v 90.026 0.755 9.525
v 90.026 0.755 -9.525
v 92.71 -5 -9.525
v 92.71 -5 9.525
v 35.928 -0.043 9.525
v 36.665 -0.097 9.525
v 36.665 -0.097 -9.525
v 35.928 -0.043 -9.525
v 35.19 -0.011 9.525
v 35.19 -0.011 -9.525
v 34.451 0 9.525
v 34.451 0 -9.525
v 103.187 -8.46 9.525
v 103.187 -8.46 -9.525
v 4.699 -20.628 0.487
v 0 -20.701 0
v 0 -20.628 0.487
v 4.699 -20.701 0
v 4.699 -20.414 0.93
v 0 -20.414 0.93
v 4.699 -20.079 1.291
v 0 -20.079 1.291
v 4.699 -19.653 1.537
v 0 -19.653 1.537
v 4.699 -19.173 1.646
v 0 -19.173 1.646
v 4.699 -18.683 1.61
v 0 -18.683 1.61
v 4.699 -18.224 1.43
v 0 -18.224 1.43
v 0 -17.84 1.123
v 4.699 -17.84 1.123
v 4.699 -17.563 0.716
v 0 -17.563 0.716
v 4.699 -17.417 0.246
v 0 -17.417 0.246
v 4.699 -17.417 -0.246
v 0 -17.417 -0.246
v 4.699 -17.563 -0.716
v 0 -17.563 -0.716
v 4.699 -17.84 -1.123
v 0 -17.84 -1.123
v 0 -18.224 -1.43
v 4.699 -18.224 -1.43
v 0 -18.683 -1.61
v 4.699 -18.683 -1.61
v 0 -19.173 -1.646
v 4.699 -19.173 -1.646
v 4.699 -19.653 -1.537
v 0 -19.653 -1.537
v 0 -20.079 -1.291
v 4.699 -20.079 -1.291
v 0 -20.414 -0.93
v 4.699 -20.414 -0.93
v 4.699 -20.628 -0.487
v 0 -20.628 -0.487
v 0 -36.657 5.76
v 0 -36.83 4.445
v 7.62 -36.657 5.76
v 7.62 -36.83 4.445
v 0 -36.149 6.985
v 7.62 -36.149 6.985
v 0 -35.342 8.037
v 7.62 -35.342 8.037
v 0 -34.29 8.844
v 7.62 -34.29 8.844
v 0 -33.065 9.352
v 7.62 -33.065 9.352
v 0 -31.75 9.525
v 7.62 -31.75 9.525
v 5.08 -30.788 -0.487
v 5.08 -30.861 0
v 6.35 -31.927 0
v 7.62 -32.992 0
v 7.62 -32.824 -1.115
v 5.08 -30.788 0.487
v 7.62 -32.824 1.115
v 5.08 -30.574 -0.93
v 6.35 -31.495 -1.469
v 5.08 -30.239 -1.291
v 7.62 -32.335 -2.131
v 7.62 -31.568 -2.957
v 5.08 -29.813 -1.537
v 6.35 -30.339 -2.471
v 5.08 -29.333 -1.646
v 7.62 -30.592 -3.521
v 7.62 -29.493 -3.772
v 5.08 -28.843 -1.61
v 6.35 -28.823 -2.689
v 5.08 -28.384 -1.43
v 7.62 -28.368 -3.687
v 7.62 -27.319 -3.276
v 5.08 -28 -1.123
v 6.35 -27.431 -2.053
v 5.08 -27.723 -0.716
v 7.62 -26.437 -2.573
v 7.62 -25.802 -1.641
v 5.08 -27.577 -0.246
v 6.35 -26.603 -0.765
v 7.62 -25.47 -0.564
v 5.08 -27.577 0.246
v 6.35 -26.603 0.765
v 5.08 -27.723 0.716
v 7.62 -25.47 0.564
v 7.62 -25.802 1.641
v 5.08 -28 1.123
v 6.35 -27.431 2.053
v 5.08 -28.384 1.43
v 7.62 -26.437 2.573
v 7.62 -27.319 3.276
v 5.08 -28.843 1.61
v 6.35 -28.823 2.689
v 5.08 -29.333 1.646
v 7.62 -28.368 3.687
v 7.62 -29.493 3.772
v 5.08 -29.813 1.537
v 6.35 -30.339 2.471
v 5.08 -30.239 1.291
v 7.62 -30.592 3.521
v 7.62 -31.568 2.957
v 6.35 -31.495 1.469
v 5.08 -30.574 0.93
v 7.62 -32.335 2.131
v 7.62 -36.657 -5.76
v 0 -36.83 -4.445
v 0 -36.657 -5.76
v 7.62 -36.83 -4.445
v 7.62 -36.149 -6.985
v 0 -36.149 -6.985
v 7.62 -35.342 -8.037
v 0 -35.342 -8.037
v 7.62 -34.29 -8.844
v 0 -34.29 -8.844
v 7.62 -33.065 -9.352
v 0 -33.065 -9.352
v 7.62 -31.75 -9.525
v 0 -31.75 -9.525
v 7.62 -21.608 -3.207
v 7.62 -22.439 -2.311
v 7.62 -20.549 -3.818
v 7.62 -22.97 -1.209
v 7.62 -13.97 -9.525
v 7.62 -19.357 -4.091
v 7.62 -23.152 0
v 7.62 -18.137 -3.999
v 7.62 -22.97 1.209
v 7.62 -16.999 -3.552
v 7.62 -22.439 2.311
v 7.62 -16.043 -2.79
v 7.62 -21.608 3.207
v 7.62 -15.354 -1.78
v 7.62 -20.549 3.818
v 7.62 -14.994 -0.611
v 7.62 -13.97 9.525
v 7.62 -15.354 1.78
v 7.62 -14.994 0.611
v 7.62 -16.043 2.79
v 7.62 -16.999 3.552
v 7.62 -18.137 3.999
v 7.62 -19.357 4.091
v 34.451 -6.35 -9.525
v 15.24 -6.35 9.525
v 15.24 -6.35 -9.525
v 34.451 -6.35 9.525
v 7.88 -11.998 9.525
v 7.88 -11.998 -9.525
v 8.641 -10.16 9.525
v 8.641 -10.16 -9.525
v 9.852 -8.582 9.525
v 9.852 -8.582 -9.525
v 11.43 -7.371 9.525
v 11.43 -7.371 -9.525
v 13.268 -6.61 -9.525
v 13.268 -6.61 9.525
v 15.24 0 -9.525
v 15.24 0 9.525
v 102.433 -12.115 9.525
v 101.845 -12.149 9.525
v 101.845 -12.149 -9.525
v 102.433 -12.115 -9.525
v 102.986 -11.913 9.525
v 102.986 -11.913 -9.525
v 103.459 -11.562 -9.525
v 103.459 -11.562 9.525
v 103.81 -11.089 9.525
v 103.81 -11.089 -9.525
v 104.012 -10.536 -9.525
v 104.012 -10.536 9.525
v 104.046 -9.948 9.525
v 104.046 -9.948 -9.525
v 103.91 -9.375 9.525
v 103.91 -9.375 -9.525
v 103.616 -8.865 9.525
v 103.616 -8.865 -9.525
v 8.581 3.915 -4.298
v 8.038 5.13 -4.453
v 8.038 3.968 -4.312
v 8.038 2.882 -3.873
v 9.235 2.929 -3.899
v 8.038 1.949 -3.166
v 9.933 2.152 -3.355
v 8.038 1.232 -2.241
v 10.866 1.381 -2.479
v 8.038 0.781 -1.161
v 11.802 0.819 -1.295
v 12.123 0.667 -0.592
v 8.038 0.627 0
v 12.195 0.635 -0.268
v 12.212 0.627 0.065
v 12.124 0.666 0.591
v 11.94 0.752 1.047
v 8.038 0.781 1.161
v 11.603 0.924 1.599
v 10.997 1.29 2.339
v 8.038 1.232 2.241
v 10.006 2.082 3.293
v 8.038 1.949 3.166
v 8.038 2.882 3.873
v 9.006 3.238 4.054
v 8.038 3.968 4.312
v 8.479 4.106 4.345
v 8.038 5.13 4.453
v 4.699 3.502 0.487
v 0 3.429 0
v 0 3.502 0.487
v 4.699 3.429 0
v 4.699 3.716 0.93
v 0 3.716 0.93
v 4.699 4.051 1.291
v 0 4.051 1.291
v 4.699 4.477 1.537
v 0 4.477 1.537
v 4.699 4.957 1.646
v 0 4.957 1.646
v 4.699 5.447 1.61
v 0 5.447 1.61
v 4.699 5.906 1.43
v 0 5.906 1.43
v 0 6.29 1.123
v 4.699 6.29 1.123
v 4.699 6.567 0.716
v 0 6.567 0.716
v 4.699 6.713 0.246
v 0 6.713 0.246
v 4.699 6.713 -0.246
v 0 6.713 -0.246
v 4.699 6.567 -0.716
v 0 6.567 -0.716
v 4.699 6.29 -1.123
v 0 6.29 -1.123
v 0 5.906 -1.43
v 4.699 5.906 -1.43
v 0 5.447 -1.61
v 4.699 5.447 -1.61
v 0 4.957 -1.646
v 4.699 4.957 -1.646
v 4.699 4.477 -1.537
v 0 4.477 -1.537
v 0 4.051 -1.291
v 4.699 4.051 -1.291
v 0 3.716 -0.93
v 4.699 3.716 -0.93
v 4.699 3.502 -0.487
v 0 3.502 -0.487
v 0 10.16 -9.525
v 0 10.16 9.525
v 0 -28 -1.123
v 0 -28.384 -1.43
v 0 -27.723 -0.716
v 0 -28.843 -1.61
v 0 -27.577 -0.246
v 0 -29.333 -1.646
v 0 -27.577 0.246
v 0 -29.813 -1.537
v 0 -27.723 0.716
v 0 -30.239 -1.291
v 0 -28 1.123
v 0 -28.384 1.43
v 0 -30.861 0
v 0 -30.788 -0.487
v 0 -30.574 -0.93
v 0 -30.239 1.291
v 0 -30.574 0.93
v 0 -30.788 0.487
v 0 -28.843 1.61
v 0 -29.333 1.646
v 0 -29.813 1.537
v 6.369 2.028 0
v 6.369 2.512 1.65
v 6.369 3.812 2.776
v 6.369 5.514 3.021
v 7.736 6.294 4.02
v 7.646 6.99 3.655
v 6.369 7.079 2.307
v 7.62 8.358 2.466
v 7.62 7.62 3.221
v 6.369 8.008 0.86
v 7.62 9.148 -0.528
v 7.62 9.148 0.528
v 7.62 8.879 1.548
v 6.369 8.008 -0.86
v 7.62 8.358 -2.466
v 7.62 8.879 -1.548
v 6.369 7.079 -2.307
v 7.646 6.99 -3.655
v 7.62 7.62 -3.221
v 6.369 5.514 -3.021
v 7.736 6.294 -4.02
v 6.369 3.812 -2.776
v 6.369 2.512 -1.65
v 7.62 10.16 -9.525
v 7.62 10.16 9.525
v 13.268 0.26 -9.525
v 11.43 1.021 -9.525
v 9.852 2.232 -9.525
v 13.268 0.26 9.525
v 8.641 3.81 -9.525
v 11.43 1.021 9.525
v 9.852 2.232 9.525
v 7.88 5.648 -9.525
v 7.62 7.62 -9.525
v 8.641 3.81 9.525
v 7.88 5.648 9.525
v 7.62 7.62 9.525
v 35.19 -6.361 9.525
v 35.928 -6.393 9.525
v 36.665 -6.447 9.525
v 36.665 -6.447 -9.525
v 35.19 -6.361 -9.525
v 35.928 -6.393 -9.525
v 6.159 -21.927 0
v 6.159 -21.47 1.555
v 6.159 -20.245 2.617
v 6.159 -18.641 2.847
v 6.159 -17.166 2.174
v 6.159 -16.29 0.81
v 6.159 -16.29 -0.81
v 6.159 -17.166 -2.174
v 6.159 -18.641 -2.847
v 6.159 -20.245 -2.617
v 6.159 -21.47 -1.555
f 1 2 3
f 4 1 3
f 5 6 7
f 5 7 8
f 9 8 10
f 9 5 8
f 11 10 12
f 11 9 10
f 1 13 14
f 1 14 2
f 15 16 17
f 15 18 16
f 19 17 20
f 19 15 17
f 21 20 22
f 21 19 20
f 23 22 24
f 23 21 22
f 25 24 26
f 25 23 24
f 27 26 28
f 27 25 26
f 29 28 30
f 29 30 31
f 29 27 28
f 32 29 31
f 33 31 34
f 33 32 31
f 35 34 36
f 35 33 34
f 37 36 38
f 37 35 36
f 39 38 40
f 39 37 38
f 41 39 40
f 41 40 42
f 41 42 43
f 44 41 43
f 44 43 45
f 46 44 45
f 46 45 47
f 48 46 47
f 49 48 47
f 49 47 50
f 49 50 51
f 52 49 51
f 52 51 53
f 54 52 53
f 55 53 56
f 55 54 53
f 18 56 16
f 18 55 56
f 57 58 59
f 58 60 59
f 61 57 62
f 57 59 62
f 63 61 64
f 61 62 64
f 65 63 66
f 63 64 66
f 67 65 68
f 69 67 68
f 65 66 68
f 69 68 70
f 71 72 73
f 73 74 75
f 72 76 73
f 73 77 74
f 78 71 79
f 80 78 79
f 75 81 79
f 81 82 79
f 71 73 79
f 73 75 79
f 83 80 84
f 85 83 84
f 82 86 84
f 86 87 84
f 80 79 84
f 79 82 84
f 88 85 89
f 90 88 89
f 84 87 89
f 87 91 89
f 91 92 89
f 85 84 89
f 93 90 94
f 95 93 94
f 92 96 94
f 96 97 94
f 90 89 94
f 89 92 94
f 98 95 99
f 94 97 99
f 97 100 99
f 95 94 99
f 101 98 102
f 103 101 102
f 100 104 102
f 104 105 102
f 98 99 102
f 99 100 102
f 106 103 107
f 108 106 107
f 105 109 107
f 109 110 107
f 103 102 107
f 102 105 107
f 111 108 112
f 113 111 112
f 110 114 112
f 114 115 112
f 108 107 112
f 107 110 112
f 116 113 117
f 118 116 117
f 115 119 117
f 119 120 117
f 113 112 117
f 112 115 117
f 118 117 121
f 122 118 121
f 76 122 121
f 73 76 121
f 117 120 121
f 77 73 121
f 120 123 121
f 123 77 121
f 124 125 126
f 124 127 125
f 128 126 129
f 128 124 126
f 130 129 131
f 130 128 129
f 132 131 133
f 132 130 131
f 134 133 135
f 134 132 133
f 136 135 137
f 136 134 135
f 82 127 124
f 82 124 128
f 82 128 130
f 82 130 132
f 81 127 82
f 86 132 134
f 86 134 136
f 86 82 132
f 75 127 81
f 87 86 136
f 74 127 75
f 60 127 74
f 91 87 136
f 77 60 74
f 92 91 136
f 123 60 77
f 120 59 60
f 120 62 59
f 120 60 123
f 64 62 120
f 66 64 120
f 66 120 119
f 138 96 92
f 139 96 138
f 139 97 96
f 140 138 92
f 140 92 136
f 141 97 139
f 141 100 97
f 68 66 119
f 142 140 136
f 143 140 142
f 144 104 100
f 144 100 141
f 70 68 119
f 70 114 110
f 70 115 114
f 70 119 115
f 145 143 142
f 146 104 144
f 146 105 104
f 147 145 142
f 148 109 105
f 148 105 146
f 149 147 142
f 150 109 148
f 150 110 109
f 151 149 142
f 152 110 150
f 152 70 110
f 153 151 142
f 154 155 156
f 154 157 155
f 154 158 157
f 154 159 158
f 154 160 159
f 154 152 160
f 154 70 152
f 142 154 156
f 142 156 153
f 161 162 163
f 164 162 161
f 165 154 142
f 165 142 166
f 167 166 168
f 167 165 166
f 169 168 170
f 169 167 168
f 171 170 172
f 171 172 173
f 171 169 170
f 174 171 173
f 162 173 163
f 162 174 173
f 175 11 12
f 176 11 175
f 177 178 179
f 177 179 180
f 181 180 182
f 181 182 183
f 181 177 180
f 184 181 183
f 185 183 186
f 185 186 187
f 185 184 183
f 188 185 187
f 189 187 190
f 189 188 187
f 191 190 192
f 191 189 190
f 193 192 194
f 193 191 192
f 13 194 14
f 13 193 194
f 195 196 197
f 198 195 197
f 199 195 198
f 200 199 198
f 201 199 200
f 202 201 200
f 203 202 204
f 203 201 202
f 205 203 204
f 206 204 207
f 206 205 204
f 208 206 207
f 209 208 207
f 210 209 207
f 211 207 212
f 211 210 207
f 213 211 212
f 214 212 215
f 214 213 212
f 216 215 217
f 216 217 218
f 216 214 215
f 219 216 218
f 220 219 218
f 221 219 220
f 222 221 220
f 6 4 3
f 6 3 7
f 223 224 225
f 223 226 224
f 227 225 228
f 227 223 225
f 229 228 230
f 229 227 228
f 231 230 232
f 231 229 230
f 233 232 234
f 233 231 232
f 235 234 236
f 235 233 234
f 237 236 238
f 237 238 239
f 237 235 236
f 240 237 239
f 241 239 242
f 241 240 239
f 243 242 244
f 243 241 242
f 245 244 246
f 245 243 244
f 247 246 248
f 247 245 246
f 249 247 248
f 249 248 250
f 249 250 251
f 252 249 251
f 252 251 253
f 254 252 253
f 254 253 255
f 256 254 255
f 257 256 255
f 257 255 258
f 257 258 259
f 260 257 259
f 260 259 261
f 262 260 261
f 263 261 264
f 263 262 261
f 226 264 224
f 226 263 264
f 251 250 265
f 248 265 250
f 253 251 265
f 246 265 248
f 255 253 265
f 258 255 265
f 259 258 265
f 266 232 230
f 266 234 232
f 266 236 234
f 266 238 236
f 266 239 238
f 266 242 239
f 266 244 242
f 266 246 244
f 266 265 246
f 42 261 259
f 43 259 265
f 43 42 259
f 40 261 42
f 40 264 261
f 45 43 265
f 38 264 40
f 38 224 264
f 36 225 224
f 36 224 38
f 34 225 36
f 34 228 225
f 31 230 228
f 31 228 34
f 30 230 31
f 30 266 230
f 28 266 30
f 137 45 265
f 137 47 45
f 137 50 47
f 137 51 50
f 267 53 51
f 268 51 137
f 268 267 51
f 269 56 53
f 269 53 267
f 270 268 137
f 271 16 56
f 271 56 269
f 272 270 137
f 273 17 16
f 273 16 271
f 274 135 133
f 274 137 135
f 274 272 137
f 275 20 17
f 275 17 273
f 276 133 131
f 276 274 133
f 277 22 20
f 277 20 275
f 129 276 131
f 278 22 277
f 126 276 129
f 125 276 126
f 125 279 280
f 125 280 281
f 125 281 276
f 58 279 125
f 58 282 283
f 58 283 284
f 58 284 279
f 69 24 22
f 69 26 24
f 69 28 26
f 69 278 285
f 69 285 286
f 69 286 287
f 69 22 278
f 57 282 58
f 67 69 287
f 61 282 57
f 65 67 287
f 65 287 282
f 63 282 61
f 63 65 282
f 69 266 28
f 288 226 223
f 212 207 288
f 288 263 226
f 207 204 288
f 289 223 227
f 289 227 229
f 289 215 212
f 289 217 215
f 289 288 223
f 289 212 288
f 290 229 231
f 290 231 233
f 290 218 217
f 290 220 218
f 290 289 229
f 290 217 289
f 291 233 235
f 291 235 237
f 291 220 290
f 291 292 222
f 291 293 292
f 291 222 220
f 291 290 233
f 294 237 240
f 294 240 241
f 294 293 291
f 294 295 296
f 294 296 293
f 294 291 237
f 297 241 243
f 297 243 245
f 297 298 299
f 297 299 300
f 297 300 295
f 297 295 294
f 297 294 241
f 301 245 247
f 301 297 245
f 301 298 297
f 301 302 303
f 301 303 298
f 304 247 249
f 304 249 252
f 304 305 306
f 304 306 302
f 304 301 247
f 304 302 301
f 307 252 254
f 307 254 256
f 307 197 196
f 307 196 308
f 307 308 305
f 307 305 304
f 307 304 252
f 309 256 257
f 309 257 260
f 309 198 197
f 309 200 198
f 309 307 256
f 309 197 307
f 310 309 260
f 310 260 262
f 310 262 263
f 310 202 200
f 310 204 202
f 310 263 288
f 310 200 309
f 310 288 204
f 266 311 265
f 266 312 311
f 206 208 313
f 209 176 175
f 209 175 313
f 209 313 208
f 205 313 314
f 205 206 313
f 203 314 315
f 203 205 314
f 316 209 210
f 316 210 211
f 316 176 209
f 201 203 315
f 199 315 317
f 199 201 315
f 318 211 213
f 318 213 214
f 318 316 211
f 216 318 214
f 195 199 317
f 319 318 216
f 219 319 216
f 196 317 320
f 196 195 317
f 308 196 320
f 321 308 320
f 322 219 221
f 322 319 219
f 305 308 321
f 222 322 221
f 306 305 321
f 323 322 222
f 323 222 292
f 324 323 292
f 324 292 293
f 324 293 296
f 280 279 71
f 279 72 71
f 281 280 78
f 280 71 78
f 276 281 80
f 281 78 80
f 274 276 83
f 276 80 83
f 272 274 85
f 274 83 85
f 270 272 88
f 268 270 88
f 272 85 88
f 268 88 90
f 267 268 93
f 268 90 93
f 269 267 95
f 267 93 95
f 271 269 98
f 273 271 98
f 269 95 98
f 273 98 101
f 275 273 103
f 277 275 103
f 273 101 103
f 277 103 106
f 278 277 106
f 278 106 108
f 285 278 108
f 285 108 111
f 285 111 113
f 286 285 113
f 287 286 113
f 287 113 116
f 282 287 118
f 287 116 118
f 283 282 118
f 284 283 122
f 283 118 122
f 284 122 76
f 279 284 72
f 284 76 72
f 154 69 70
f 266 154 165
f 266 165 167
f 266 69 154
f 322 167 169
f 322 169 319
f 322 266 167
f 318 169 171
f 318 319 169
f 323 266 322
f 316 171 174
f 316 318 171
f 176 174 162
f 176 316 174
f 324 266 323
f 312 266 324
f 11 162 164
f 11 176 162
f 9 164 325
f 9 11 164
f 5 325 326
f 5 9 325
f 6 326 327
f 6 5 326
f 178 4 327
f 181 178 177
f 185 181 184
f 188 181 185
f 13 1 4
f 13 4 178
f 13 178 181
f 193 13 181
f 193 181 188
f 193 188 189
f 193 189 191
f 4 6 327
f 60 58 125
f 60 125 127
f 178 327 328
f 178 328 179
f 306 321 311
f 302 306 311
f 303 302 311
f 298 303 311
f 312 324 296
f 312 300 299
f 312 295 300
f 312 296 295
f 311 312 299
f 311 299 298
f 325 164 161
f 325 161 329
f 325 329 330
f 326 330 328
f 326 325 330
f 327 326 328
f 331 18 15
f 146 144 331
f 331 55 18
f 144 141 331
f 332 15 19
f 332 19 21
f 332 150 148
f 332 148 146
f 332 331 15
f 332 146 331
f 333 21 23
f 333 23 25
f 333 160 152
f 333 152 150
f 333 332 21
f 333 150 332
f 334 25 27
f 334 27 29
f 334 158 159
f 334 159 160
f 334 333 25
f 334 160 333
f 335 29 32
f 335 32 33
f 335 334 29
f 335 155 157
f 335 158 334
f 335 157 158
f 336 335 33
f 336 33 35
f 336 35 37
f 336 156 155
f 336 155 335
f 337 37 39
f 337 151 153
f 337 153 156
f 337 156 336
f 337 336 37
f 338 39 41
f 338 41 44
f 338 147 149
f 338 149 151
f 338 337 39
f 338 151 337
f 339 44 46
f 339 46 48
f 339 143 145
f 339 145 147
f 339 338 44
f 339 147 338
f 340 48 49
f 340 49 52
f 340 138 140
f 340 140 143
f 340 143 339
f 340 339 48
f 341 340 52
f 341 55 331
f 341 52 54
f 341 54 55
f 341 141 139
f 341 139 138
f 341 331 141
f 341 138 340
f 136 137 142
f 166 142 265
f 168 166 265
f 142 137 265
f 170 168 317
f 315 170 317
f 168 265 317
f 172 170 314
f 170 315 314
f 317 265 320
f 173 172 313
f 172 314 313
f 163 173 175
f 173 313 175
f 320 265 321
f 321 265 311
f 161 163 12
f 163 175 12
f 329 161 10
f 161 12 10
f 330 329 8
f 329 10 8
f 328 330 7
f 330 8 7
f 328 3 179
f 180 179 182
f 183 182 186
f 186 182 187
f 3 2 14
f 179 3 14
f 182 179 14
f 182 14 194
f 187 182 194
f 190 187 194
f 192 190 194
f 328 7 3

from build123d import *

# Parameters (mm, degrees)
F1_DEPTH = 9.525
F6_R     = 5.08


with BuildPart() as f1:
    # F0 (on Top) → F1 (new body, symmetric)
    with BuildSketch(Plane.XY):
        with BuildLine():
            Line((0, 0), (0, -36.83))
            Line((0, -36.83), (7.62, -36.83))
            Line((7.62, -36.83), (7.62, -13.97))
            ThreePointArc((7.62, -13.97), (9.851846, -8.581846), (15.24, -6.35))
            Line((15.24, -6.35), (34.451012, -6.35))
            ThreePointArc((34.451012, -6.35), (35.558944, -6.374175), (36.664768, -6.446655))
            Line((36.664768, -6.446655), (101.84481, -12.149169))
            ThreePointArc((101.84481, -12.149169), (103.931366, -10.819887), (103.187418, -8.460385))
            Line((103.187418, -8.460385), (90.026374, 0.755077))
            Line((90.026374, 0.755077), (92.71, -4.999977))
            Line((92.71, -4.999977), (36.664768, -0.096655))
            ThreePointArc((36.664768, -0.096655), (35.558944, -0.024175), (34.451012, 0))
            Line((34.451012, 0), (15.24, 0))
            ThreePointArc((15.24, 0), (9.851846, 2.231846), (7.62, 7.62))
            Line((7.62, 7.62), (7.62, 10.16))
            Line((7.62, 10.16), (0, 10.16))
            Line((0, 10.16), (0, 0))
        make_face()
    extrude(amount=F1_DEPTH, both=True)

    # F2 (on Top) → F3 (revolve, cut)
    with BuildSketch(Plane.XY):
        Polygon((0, -19.05), (0, -20.701), (4.699, -20.701), (9.652, -24.85706), (11.555037, -24.85706), (11.555037, -19.05), (9.652, -19.05), align=None)
    revolve(axis=Axis((-2.504904, -19.05, 0), (-1, 0, 0)), mode=Mode.SUBTRACT)

    # F4 (on Top) → F5 (revolve, cut)
    with BuildSketch(Plane.XY):
        Polygon((7.62, -29.21), (0, -29.21), (0, -30.861), (5.08, -30.861), (7.62, -32.992313), align=None)
    revolve(axis=Axis((3.81, -29.21, 0), (1, 0, 0)), mode=Mode.SUBTRACT)

    # F6
    f6_edges = [f1.edges().sort_by_distance(p)[0] for p in [
        (3.81, -36.83, 9.525),
        (3.81, -36.83, -9.525),
    ]]
    fillet(f6_edges, radius=F6_R)

    # F7 (on Top) → F8 (revolve, cut)
    with BuildSketch(Plane.XY):
        Polygon((0, 5.08), (0, 3.429), (4.699, 3.429), (8.038316, 0.626982), (15.24, 0.626982), (15.24, 5.08), (8.038316, 5.08), align=None)
    revolve(axis=Axis((4.019158, 5.08, 0), (-1, 0, 0)), mode=Mode.SUBTRACT)


solid = f1.part
